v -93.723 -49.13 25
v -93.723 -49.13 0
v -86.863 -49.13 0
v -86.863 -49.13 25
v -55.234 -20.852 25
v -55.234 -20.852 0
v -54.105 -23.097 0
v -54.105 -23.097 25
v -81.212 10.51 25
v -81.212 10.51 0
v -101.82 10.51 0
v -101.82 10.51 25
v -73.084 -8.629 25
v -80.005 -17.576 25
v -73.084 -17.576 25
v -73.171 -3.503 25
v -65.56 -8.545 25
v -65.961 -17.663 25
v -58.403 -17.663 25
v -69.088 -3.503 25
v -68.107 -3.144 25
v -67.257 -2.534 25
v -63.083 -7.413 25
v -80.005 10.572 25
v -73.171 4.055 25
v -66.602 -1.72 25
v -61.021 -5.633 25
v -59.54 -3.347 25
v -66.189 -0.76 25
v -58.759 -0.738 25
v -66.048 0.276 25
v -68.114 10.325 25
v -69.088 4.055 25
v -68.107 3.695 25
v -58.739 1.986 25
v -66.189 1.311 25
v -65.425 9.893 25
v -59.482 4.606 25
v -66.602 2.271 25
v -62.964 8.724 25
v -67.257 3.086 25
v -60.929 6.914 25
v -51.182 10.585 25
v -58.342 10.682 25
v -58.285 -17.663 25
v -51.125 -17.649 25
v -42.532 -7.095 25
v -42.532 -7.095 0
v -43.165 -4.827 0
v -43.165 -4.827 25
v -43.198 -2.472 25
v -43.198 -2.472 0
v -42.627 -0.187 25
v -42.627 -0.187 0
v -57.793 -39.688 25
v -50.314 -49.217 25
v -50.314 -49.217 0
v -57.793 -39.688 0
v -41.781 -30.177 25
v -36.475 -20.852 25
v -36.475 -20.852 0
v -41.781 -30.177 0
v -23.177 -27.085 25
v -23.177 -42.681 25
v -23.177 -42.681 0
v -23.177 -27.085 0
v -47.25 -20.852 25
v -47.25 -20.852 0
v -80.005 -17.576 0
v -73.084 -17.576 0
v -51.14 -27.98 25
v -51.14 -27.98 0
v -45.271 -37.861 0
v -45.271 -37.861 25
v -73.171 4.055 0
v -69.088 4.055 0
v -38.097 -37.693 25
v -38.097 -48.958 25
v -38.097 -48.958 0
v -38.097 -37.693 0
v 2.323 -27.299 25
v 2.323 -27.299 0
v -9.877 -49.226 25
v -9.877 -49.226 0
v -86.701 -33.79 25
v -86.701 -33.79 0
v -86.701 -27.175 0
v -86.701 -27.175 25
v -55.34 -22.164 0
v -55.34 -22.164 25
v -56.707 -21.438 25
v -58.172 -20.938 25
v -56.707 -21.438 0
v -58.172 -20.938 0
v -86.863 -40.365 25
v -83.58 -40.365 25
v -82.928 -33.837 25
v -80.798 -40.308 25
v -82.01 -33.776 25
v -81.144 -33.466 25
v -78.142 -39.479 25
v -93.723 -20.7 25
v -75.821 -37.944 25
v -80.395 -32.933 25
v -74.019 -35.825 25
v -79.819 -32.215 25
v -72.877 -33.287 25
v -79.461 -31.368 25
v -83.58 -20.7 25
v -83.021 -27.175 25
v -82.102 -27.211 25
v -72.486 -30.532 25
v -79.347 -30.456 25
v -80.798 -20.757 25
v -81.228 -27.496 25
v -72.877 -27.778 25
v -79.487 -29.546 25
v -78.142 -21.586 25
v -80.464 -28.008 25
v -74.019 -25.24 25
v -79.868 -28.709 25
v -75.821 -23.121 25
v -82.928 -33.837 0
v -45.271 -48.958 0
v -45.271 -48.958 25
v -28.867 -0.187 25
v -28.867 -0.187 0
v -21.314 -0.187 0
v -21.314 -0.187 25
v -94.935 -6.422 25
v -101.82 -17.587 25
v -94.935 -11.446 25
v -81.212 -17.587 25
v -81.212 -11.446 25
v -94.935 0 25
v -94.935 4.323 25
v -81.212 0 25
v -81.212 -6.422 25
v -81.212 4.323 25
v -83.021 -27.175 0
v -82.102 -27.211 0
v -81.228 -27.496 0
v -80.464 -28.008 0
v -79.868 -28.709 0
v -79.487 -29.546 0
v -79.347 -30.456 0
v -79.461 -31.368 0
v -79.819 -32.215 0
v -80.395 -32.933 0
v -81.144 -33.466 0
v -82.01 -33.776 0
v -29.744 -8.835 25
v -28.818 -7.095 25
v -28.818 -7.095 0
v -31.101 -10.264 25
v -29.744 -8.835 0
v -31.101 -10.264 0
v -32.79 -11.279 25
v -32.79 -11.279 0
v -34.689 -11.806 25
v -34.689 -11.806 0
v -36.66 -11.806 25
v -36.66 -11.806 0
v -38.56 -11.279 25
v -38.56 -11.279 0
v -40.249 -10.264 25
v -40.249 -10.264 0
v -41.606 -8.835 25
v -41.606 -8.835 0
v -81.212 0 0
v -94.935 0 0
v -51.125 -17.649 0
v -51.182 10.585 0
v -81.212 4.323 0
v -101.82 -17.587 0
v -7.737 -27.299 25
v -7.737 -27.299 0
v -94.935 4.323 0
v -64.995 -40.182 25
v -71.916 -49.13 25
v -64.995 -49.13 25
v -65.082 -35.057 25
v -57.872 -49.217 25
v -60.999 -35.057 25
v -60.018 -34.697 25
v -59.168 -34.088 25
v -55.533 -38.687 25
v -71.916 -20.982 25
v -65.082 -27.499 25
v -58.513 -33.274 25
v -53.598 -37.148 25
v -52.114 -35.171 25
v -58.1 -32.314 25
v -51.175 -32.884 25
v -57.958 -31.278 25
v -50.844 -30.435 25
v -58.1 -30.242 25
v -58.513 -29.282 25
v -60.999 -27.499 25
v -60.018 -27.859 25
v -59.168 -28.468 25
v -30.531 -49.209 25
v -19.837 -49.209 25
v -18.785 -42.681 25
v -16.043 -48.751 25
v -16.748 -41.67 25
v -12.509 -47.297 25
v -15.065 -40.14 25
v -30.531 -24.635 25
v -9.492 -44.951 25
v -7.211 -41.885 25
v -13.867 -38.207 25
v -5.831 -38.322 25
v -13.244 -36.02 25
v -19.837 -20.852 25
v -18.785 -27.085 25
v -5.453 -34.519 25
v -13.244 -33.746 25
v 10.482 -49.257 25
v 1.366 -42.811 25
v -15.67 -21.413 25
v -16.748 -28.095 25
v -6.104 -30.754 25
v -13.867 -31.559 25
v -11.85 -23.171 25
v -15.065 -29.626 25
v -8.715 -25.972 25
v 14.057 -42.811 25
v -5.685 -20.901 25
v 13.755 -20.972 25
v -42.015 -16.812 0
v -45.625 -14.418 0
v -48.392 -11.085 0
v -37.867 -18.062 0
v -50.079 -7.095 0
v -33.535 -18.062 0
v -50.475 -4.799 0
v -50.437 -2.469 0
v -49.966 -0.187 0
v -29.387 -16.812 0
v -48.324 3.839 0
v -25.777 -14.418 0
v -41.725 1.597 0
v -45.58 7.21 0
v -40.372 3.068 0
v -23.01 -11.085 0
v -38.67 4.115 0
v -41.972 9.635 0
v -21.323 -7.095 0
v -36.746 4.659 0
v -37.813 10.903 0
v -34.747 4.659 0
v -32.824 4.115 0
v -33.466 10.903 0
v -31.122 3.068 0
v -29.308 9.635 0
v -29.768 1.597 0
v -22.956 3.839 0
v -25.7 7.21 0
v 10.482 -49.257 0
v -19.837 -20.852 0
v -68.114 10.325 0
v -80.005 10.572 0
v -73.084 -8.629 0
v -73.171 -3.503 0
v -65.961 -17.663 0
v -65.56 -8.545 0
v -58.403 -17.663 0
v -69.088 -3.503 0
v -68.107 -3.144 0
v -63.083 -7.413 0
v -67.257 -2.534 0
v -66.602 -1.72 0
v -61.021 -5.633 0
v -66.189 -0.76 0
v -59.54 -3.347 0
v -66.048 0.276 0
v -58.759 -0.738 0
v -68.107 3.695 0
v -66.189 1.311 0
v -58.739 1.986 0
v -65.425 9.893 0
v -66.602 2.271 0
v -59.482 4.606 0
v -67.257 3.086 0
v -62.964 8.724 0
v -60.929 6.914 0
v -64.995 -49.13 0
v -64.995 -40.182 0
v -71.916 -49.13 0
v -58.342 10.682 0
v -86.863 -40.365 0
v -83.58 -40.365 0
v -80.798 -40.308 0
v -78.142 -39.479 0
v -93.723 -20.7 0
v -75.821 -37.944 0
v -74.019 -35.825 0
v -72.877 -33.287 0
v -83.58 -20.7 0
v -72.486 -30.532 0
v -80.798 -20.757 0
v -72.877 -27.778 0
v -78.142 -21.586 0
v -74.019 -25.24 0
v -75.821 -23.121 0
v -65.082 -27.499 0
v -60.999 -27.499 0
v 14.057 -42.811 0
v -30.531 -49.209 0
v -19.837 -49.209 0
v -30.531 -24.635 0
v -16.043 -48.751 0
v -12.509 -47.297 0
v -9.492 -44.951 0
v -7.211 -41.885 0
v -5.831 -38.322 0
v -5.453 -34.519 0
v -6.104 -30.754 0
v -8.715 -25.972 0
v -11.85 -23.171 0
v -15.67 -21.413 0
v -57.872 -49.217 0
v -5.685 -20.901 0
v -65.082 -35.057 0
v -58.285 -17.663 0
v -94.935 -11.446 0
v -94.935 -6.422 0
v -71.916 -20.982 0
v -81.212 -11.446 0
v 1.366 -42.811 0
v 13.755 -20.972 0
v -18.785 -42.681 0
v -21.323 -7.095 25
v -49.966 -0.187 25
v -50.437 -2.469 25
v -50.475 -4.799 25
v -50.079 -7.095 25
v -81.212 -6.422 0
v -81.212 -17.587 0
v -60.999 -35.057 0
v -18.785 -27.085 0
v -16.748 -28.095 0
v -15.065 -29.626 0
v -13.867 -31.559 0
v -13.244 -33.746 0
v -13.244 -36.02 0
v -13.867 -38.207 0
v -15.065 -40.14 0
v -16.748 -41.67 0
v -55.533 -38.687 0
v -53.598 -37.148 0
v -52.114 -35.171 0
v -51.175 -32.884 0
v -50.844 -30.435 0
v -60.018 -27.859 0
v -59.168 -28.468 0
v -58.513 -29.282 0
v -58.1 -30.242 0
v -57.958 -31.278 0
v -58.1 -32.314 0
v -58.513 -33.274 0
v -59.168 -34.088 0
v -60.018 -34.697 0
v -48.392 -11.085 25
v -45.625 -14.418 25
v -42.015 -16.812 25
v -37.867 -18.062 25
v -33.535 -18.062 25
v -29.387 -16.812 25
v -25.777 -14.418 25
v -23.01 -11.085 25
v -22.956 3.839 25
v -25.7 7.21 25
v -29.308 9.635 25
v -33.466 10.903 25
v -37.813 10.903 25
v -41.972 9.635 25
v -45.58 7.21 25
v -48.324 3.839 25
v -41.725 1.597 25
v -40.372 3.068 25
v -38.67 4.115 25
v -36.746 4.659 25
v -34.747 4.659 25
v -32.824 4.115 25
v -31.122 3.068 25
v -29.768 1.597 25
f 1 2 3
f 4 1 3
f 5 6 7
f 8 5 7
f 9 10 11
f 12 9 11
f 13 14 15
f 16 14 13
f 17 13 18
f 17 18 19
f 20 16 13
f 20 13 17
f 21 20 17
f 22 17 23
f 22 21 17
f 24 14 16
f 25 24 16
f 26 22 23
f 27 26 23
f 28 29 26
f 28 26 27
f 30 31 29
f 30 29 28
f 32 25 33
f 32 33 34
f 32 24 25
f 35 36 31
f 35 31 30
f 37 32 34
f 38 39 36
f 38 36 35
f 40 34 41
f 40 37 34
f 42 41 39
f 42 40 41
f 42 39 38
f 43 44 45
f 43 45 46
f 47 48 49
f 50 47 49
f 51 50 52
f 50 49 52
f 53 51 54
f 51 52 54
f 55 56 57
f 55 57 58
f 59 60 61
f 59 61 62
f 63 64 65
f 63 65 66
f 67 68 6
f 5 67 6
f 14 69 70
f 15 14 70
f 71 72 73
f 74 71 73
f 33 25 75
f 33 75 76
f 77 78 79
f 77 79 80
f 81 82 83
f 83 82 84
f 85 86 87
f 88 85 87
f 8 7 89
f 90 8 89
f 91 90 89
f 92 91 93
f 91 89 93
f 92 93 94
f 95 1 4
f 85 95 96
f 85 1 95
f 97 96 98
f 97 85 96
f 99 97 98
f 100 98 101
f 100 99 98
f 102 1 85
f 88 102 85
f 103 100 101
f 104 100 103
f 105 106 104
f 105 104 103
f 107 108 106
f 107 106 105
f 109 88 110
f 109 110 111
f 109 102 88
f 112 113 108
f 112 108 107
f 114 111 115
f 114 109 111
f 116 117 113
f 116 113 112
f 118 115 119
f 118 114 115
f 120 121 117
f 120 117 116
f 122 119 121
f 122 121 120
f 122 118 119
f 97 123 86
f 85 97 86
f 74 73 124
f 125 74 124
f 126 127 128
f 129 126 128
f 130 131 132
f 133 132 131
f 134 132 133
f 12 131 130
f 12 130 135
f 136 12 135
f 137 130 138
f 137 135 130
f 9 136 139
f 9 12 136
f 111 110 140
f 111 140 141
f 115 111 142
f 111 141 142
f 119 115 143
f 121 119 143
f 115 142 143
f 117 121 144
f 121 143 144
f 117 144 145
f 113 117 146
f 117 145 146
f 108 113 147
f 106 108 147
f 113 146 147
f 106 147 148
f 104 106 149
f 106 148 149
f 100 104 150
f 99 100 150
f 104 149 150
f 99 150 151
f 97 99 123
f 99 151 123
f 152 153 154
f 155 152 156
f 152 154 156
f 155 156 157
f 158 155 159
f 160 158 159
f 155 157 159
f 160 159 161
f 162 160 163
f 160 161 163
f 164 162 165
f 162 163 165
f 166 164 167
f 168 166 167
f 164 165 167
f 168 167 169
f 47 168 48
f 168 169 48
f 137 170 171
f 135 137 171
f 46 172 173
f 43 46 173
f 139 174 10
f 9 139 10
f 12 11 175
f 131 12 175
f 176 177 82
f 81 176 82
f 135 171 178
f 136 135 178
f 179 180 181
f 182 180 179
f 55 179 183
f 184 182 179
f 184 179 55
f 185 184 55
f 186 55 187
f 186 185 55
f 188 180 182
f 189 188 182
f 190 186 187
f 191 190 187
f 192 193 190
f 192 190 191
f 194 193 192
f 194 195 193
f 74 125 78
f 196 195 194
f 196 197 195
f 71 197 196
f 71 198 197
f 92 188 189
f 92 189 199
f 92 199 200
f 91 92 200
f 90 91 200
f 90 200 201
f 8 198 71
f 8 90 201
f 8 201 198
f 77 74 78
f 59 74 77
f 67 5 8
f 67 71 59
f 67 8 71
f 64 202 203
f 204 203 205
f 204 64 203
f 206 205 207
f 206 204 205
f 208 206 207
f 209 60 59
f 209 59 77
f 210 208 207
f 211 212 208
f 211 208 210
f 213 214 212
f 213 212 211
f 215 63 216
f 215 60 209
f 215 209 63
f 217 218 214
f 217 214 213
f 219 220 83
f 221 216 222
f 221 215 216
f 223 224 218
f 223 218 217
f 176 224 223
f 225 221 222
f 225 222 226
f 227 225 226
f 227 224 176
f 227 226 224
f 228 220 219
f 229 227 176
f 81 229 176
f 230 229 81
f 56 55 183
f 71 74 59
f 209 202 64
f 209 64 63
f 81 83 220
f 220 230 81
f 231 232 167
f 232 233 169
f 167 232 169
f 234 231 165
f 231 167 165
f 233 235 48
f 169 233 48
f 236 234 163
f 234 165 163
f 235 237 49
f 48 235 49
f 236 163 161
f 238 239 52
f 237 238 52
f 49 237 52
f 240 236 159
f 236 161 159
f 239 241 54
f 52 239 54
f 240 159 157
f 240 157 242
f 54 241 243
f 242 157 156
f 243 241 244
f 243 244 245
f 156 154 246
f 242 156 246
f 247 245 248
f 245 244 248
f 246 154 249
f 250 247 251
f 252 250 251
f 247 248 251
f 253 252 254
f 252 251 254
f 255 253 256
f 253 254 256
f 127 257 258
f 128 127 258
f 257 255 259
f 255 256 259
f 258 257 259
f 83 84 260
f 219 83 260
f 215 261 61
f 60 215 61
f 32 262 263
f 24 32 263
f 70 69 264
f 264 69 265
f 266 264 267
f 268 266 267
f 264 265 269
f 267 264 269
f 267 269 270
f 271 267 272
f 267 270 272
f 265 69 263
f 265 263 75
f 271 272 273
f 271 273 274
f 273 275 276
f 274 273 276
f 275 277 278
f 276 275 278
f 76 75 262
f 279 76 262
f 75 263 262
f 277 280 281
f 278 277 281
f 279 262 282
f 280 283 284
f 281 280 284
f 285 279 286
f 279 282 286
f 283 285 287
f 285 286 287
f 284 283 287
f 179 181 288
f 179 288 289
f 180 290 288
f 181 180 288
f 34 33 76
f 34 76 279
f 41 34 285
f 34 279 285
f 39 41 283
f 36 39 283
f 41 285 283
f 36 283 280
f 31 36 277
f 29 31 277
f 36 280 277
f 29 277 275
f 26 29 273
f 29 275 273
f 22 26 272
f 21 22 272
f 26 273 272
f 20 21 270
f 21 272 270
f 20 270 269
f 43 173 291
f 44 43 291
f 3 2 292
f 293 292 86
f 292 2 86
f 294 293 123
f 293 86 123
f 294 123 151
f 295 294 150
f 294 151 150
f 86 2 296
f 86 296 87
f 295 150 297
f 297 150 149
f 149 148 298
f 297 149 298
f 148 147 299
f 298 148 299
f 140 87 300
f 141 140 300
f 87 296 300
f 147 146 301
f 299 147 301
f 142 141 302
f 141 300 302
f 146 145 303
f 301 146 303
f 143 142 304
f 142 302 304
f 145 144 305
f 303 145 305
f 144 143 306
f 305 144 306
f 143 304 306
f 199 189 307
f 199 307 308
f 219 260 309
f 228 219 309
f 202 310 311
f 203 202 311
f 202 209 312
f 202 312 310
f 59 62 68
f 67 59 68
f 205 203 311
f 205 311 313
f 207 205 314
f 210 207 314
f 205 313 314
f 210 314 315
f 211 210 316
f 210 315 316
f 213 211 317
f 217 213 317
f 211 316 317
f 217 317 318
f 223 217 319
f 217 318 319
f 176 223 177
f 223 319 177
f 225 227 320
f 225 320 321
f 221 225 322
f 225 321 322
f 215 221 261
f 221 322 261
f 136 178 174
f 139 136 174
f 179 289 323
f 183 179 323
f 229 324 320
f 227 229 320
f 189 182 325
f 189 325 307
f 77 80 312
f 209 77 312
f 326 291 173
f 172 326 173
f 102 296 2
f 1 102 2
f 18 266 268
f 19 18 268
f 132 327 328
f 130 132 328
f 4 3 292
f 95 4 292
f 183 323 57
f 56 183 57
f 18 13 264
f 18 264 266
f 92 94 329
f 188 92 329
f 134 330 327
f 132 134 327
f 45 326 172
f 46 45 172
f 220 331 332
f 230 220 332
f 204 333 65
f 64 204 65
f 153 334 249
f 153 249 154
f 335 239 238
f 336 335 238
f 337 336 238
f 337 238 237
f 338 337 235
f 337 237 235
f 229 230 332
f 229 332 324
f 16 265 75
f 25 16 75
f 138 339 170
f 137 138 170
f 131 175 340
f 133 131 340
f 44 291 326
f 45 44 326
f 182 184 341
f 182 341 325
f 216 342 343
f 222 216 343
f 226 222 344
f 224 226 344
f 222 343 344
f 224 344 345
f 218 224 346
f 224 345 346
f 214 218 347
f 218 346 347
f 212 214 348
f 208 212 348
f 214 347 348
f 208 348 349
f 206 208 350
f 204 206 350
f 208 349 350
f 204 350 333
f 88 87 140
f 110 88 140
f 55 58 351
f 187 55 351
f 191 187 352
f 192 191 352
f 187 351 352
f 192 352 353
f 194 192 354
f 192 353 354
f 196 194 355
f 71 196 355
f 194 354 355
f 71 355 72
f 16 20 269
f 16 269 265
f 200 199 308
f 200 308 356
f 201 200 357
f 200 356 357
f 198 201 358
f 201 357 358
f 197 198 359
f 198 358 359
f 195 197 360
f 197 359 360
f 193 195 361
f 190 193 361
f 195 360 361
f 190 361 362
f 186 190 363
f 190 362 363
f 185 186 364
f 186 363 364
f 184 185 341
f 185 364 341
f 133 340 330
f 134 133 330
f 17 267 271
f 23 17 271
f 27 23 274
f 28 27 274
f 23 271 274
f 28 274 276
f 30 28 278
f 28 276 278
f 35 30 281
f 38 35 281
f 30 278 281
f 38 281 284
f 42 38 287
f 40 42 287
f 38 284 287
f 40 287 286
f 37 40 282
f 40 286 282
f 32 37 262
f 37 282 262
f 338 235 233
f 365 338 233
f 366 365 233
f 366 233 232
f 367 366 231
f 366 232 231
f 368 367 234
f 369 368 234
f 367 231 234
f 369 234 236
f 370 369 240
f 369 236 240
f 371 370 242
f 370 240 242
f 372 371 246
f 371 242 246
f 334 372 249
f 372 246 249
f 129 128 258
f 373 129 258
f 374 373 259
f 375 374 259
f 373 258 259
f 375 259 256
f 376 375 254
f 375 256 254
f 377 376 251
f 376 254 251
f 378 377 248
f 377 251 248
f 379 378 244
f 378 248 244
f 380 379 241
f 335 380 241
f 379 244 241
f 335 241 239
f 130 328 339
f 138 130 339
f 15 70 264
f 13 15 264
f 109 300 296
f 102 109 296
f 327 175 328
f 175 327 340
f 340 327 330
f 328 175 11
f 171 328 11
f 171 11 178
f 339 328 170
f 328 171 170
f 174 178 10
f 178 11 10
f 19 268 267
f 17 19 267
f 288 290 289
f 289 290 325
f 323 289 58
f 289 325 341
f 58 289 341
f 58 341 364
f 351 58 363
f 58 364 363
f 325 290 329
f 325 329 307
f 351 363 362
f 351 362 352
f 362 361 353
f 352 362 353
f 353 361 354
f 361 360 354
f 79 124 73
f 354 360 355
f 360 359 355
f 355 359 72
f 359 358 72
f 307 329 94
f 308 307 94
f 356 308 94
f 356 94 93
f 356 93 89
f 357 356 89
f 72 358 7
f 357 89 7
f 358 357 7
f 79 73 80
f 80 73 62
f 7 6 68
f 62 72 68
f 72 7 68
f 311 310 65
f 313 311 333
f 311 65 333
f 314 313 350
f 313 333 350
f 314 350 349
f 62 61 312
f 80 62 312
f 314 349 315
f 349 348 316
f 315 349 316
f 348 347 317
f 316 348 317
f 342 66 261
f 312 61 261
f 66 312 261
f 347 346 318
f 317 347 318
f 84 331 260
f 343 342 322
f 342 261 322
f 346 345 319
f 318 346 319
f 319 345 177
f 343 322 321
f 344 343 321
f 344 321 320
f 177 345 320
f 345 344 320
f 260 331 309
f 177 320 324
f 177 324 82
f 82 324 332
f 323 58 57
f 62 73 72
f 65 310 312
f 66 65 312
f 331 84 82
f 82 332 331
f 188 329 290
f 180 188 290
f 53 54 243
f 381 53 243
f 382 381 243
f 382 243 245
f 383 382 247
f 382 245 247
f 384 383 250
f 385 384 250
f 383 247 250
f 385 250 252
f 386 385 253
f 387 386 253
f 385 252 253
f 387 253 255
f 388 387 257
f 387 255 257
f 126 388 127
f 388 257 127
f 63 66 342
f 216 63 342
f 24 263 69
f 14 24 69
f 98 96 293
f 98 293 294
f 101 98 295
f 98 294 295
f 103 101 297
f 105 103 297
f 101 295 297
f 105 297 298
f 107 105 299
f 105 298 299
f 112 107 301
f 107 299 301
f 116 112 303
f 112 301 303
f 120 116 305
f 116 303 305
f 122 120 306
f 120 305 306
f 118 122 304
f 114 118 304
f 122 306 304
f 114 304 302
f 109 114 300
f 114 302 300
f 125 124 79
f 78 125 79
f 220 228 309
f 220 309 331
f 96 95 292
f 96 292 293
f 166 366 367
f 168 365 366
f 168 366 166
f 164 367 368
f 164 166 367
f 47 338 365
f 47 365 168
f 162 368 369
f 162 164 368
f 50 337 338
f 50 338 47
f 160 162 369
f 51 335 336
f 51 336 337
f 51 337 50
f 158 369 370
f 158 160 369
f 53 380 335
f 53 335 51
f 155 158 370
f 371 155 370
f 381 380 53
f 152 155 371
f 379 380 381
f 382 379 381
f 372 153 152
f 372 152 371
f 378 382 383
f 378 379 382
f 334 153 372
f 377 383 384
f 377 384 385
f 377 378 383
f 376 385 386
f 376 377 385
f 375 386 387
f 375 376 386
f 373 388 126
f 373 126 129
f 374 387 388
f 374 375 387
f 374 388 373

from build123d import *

# Parameters (mm, degrees)
F1_DEPTH = 25


with BuildPart() as f1:
    # F0 (on Top) → F1 (new body)
    with BuildSketch(Plane.XY):
        Polygon((-101.819627, 10.509911), (-101.819627, -17.586585), (-81.212424, -17.586585), (-81.212424, -11.44629), (-94.935052, -11.44629), (-94.935052, -6.422414), (-81.212424, -6.422414), (-81.212424, 0), (-94.935052, 0), (-94.935052, 4.323101), (-81.212424, 4.323101), (-81.212424, 10.509911), align=None)
        with BuildLine():
            Line((-68.11396, 10.325195), (-80.005154, 10.571739))
            Line((-80.005154, 10.571739), (-80.005154, -17.576434))
            Line((-80.005154, -17.576434), (-73.084339, -17.576434))
            Line((-73.084339, -17.576434), (-73.084339, -8.628672))
            Line((-73.084339, -8.628672), (-65.960877, -17.663306))
            Line((-65.960877, -17.663306), (-58.40306, -17.663306))
            Line((-58.40306, -17.663306), (-65.560192, -8.545102))
            ThreePointArc((-65.560192, -8.545102), (-58.738702, 1.986021), (-68.11396, 10.325195))
        make_face()
        with BuildLine():
            Line((-73.171213, -3.503253), (-73.171213, 4.054567))
            Line((-73.171213, 4.054567), (-69.08825, 4.054567))
            ThreePointArc((-69.08825, 4.054567), (-66.047507, 0.275657), (-69.08825, -3.503253))
            Line((-69.08825, -3.503253), (-73.171213, -3.503253))
        make_face(mode=Mode.SUBTRACT)
        Polygon((-51.182448, 10.584728), (-58.34233, 10.681977), (-58.284808, -17.663306), (-51.125153, -17.648776), align=None)
        with BuildLine():
            ThreePointArc((-42.627156, -0.186757), (-35.746869, 4.728277), (-28.866582, -0.186757))
            Line((-28.866582, -0.186757), (-21.313882, -0.186757))
            ThreePointArc((-21.313882, -0.186757), (-35.639831, 11.064195), (-49.96578, -0.186757))
            ThreePointArc((-49.96578, -0.186757), (-50.510255, -3.632955), (-50.078802, -7.095119))
            ThreePointArc((-50.078802, -7.095119), (-35.701002, -18.220281), (-21.323202, -7.095119))
            Line((-21.323202, -7.095119), (-28.817637, -7.095119))
            ThreePointArc((-28.817637, -7.095119), (-35.674944, -11.872304), (-42.53225, -7.095119))
            ThreePointArc((-42.53225, -7.095119), (-43.257806, -3.650254), (-42.627156, -0.186757))
        make_face()
        with BuildLine():
            Line((-55.234315, -20.852463), (-54.105148, -23.09729))
            ThreePointArc((-54.105148, -23.09729), (-52.256175, -25.316219), (-51.140224, -27.980238))
            Line((-51.140224, -27.980238), (-45.270536, -37.861388))
            Line((-45.270536, -37.861388), (-45.270536, -48.957791))
            Line((-45.270536, -48.957791), (-38.097106, -48.957791))
            Line((-38.097106, -48.957791), (-38.097106, -37.693258))
            Line((-38.097106, -37.693258), (-30.531377, -24.635373))
            Line((-30.531377, -24.635373), (-30.531377, -49.209004))
            Line((-30.531377, -49.209004), (-19.836601, -49.209004))
            ThreePointArc((-19.836601, -49.209004), (-7.21076, -41.885473), (-7.737281, -27.298879))
            ThreePointArc((-7.737281, -27.298879), (-8.206641, -26.621257), (-8.714583, -25.972052))
            ThreePointArc((-8.714583, -25.972052), (-13.694552, -22.149981), (-19.836601, -20.852463))
            Line((-19.836601, -20.852463), (-36.474702, -20.852463))
            Line((-36.474702, -20.852463), (-41.78071, -30.177152))
            Line((-41.78071, -30.177152), (-47.250369, -20.852463))
            Line((-47.250369, -20.852463), (-55.234315, -20.852463))
        make_face()
        with BuildLine():
            Line((-23.177242, -42.680707), (-23.177242, -27.084634))
            Line((-23.177242, -27.084634), (-18.784676, -27.084634))
            ThreePointArc((-18.784676, -27.084634), (-13.164762, -34.88267), (-18.784676, -42.680707))
            Line((-18.784676, -42.680707), (-23.177242, -42.680707))
        make_face(mode=Mode.SUBTRACT)
        with BuildLine():
            Line((-58.172056, -20.937729), (-71.916036, -20.981817))
            Line((-71.916036, -20.981817), (-71.916036, -49.129989))
            Line((-71.916036, -49.129989), (-64.995222, -49.129989))
            Line((-64.995222, -49.129989), (-64.995222, -40.182227))
            Line((-64.995222, -40.182227), (-57.871759, -49.216861))
            Line((-57.871759, -49.216861), (-50.313942, -49.216861))
            Line((-50.313942, -49.216861), (-57.793416, -39.687994))
            ThreePointArc((-57.793416, -39.687994), (-52.113595, -35.171388), (-51.140224, -27.980238))
            ThreePointArc((-51.140224, -27.980238), (-52.256175, -25.316219), (-54.105148, -23.09729))
            ThreePointArc((-54.105148, -23.09729), (-56.008982, -21.773407), (-58.172056, -20.937729))
        make_face()
        with BuildLine():
            Line((-65.082096, -35.056808), (-65.082096, -27.498988))
            Line((-65.082096, -27.498988), (-60.999133, -27.498988))
            ThreePointArc((-60.999133, -27.498988), (-57.958389, -31.277898), (-60.999133, -35.056808))
            Line((-60.999133, -35.056808), (-65.082096, -35.056808))
        make_face(mode=Mode.SUBTRACT)
        with BuildLine():
            Line((-83.580248, -20.7002), (-93.72317, -20.7002))
            Line((-93.72317, -20.7002), (-93.72317, -49.129989))
            Line((-93.72317, -49.129989), (-86.863182, -49.129989))
            Line((-86.863182, -49.129989), (-86.863182, -40.364787))
            Line((-86.863182, -40.364787), (-83.580248, -40.364787))
            ThreePointArc((-83.580248, -40.364787), (-72.486284, -30.532493), (-83.580248, -20.7002))
        make_face()
        with BuildLine():
            ThreePointArc((-83.021238, -27.175458), (-79.347314, -30.455526), (-82.928069, -33.837058))
            Line((-82.928069, -33.837058), (-86.701423, -33.790473))
            Line((-86.701423, -33.790473), (-86.701423, -27.175458))
            Line((-86.701423, -27.175458), (-83.021238, -27.175458))
        make_face(mode=Mode.SUBTRACT)
        with BuildLine():
            Line((-5.684703, -20.901453), (-8.714583, -25.972052))
            ThreePointArc((-8.714583, -25.972052), (-8.206641, -26.621257), (-7.737281, -27.298879))
            Line((-7.737281, -27.298879), (2.322947, -27.298879))
            Line((2.322947, -27.298879), (-9.876917, -49.225628))
            Line((-9.876917, -49.225628), (10.48169, -49.256977))
            Line((10.48169, -49.256977), (14.057434, -42.810563))
            Line((14.057434, -42.810563), (1.366057, -42.810563))
            Line((1.366057, -42.810563), (13.755192, -20.972135))
            Line((13.755192, -20.972135), (-5.684703, -20.901453))
        make_face()
    extrude(amount=F1_DEPTH)


solid = f1.part
